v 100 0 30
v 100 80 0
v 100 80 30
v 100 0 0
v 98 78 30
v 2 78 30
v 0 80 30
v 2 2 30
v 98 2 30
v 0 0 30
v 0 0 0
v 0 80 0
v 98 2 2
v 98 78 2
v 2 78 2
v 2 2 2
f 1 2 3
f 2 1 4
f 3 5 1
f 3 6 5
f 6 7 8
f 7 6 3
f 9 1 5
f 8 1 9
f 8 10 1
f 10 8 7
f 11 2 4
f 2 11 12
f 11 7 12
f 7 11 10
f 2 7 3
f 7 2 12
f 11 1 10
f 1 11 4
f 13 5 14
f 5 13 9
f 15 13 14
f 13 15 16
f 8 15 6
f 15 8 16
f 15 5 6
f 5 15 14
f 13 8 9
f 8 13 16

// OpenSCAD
$fn=48;
translate([0,0,0])
{
difference()
{
    cube(size = [100.00, 80.00, 30.00], center = false); 
    translate(v = [2.00, 2.00, 2.00])
    {
        cube(size = [96.00, 76.00, 28.00], center = false); 
    }
}

}
